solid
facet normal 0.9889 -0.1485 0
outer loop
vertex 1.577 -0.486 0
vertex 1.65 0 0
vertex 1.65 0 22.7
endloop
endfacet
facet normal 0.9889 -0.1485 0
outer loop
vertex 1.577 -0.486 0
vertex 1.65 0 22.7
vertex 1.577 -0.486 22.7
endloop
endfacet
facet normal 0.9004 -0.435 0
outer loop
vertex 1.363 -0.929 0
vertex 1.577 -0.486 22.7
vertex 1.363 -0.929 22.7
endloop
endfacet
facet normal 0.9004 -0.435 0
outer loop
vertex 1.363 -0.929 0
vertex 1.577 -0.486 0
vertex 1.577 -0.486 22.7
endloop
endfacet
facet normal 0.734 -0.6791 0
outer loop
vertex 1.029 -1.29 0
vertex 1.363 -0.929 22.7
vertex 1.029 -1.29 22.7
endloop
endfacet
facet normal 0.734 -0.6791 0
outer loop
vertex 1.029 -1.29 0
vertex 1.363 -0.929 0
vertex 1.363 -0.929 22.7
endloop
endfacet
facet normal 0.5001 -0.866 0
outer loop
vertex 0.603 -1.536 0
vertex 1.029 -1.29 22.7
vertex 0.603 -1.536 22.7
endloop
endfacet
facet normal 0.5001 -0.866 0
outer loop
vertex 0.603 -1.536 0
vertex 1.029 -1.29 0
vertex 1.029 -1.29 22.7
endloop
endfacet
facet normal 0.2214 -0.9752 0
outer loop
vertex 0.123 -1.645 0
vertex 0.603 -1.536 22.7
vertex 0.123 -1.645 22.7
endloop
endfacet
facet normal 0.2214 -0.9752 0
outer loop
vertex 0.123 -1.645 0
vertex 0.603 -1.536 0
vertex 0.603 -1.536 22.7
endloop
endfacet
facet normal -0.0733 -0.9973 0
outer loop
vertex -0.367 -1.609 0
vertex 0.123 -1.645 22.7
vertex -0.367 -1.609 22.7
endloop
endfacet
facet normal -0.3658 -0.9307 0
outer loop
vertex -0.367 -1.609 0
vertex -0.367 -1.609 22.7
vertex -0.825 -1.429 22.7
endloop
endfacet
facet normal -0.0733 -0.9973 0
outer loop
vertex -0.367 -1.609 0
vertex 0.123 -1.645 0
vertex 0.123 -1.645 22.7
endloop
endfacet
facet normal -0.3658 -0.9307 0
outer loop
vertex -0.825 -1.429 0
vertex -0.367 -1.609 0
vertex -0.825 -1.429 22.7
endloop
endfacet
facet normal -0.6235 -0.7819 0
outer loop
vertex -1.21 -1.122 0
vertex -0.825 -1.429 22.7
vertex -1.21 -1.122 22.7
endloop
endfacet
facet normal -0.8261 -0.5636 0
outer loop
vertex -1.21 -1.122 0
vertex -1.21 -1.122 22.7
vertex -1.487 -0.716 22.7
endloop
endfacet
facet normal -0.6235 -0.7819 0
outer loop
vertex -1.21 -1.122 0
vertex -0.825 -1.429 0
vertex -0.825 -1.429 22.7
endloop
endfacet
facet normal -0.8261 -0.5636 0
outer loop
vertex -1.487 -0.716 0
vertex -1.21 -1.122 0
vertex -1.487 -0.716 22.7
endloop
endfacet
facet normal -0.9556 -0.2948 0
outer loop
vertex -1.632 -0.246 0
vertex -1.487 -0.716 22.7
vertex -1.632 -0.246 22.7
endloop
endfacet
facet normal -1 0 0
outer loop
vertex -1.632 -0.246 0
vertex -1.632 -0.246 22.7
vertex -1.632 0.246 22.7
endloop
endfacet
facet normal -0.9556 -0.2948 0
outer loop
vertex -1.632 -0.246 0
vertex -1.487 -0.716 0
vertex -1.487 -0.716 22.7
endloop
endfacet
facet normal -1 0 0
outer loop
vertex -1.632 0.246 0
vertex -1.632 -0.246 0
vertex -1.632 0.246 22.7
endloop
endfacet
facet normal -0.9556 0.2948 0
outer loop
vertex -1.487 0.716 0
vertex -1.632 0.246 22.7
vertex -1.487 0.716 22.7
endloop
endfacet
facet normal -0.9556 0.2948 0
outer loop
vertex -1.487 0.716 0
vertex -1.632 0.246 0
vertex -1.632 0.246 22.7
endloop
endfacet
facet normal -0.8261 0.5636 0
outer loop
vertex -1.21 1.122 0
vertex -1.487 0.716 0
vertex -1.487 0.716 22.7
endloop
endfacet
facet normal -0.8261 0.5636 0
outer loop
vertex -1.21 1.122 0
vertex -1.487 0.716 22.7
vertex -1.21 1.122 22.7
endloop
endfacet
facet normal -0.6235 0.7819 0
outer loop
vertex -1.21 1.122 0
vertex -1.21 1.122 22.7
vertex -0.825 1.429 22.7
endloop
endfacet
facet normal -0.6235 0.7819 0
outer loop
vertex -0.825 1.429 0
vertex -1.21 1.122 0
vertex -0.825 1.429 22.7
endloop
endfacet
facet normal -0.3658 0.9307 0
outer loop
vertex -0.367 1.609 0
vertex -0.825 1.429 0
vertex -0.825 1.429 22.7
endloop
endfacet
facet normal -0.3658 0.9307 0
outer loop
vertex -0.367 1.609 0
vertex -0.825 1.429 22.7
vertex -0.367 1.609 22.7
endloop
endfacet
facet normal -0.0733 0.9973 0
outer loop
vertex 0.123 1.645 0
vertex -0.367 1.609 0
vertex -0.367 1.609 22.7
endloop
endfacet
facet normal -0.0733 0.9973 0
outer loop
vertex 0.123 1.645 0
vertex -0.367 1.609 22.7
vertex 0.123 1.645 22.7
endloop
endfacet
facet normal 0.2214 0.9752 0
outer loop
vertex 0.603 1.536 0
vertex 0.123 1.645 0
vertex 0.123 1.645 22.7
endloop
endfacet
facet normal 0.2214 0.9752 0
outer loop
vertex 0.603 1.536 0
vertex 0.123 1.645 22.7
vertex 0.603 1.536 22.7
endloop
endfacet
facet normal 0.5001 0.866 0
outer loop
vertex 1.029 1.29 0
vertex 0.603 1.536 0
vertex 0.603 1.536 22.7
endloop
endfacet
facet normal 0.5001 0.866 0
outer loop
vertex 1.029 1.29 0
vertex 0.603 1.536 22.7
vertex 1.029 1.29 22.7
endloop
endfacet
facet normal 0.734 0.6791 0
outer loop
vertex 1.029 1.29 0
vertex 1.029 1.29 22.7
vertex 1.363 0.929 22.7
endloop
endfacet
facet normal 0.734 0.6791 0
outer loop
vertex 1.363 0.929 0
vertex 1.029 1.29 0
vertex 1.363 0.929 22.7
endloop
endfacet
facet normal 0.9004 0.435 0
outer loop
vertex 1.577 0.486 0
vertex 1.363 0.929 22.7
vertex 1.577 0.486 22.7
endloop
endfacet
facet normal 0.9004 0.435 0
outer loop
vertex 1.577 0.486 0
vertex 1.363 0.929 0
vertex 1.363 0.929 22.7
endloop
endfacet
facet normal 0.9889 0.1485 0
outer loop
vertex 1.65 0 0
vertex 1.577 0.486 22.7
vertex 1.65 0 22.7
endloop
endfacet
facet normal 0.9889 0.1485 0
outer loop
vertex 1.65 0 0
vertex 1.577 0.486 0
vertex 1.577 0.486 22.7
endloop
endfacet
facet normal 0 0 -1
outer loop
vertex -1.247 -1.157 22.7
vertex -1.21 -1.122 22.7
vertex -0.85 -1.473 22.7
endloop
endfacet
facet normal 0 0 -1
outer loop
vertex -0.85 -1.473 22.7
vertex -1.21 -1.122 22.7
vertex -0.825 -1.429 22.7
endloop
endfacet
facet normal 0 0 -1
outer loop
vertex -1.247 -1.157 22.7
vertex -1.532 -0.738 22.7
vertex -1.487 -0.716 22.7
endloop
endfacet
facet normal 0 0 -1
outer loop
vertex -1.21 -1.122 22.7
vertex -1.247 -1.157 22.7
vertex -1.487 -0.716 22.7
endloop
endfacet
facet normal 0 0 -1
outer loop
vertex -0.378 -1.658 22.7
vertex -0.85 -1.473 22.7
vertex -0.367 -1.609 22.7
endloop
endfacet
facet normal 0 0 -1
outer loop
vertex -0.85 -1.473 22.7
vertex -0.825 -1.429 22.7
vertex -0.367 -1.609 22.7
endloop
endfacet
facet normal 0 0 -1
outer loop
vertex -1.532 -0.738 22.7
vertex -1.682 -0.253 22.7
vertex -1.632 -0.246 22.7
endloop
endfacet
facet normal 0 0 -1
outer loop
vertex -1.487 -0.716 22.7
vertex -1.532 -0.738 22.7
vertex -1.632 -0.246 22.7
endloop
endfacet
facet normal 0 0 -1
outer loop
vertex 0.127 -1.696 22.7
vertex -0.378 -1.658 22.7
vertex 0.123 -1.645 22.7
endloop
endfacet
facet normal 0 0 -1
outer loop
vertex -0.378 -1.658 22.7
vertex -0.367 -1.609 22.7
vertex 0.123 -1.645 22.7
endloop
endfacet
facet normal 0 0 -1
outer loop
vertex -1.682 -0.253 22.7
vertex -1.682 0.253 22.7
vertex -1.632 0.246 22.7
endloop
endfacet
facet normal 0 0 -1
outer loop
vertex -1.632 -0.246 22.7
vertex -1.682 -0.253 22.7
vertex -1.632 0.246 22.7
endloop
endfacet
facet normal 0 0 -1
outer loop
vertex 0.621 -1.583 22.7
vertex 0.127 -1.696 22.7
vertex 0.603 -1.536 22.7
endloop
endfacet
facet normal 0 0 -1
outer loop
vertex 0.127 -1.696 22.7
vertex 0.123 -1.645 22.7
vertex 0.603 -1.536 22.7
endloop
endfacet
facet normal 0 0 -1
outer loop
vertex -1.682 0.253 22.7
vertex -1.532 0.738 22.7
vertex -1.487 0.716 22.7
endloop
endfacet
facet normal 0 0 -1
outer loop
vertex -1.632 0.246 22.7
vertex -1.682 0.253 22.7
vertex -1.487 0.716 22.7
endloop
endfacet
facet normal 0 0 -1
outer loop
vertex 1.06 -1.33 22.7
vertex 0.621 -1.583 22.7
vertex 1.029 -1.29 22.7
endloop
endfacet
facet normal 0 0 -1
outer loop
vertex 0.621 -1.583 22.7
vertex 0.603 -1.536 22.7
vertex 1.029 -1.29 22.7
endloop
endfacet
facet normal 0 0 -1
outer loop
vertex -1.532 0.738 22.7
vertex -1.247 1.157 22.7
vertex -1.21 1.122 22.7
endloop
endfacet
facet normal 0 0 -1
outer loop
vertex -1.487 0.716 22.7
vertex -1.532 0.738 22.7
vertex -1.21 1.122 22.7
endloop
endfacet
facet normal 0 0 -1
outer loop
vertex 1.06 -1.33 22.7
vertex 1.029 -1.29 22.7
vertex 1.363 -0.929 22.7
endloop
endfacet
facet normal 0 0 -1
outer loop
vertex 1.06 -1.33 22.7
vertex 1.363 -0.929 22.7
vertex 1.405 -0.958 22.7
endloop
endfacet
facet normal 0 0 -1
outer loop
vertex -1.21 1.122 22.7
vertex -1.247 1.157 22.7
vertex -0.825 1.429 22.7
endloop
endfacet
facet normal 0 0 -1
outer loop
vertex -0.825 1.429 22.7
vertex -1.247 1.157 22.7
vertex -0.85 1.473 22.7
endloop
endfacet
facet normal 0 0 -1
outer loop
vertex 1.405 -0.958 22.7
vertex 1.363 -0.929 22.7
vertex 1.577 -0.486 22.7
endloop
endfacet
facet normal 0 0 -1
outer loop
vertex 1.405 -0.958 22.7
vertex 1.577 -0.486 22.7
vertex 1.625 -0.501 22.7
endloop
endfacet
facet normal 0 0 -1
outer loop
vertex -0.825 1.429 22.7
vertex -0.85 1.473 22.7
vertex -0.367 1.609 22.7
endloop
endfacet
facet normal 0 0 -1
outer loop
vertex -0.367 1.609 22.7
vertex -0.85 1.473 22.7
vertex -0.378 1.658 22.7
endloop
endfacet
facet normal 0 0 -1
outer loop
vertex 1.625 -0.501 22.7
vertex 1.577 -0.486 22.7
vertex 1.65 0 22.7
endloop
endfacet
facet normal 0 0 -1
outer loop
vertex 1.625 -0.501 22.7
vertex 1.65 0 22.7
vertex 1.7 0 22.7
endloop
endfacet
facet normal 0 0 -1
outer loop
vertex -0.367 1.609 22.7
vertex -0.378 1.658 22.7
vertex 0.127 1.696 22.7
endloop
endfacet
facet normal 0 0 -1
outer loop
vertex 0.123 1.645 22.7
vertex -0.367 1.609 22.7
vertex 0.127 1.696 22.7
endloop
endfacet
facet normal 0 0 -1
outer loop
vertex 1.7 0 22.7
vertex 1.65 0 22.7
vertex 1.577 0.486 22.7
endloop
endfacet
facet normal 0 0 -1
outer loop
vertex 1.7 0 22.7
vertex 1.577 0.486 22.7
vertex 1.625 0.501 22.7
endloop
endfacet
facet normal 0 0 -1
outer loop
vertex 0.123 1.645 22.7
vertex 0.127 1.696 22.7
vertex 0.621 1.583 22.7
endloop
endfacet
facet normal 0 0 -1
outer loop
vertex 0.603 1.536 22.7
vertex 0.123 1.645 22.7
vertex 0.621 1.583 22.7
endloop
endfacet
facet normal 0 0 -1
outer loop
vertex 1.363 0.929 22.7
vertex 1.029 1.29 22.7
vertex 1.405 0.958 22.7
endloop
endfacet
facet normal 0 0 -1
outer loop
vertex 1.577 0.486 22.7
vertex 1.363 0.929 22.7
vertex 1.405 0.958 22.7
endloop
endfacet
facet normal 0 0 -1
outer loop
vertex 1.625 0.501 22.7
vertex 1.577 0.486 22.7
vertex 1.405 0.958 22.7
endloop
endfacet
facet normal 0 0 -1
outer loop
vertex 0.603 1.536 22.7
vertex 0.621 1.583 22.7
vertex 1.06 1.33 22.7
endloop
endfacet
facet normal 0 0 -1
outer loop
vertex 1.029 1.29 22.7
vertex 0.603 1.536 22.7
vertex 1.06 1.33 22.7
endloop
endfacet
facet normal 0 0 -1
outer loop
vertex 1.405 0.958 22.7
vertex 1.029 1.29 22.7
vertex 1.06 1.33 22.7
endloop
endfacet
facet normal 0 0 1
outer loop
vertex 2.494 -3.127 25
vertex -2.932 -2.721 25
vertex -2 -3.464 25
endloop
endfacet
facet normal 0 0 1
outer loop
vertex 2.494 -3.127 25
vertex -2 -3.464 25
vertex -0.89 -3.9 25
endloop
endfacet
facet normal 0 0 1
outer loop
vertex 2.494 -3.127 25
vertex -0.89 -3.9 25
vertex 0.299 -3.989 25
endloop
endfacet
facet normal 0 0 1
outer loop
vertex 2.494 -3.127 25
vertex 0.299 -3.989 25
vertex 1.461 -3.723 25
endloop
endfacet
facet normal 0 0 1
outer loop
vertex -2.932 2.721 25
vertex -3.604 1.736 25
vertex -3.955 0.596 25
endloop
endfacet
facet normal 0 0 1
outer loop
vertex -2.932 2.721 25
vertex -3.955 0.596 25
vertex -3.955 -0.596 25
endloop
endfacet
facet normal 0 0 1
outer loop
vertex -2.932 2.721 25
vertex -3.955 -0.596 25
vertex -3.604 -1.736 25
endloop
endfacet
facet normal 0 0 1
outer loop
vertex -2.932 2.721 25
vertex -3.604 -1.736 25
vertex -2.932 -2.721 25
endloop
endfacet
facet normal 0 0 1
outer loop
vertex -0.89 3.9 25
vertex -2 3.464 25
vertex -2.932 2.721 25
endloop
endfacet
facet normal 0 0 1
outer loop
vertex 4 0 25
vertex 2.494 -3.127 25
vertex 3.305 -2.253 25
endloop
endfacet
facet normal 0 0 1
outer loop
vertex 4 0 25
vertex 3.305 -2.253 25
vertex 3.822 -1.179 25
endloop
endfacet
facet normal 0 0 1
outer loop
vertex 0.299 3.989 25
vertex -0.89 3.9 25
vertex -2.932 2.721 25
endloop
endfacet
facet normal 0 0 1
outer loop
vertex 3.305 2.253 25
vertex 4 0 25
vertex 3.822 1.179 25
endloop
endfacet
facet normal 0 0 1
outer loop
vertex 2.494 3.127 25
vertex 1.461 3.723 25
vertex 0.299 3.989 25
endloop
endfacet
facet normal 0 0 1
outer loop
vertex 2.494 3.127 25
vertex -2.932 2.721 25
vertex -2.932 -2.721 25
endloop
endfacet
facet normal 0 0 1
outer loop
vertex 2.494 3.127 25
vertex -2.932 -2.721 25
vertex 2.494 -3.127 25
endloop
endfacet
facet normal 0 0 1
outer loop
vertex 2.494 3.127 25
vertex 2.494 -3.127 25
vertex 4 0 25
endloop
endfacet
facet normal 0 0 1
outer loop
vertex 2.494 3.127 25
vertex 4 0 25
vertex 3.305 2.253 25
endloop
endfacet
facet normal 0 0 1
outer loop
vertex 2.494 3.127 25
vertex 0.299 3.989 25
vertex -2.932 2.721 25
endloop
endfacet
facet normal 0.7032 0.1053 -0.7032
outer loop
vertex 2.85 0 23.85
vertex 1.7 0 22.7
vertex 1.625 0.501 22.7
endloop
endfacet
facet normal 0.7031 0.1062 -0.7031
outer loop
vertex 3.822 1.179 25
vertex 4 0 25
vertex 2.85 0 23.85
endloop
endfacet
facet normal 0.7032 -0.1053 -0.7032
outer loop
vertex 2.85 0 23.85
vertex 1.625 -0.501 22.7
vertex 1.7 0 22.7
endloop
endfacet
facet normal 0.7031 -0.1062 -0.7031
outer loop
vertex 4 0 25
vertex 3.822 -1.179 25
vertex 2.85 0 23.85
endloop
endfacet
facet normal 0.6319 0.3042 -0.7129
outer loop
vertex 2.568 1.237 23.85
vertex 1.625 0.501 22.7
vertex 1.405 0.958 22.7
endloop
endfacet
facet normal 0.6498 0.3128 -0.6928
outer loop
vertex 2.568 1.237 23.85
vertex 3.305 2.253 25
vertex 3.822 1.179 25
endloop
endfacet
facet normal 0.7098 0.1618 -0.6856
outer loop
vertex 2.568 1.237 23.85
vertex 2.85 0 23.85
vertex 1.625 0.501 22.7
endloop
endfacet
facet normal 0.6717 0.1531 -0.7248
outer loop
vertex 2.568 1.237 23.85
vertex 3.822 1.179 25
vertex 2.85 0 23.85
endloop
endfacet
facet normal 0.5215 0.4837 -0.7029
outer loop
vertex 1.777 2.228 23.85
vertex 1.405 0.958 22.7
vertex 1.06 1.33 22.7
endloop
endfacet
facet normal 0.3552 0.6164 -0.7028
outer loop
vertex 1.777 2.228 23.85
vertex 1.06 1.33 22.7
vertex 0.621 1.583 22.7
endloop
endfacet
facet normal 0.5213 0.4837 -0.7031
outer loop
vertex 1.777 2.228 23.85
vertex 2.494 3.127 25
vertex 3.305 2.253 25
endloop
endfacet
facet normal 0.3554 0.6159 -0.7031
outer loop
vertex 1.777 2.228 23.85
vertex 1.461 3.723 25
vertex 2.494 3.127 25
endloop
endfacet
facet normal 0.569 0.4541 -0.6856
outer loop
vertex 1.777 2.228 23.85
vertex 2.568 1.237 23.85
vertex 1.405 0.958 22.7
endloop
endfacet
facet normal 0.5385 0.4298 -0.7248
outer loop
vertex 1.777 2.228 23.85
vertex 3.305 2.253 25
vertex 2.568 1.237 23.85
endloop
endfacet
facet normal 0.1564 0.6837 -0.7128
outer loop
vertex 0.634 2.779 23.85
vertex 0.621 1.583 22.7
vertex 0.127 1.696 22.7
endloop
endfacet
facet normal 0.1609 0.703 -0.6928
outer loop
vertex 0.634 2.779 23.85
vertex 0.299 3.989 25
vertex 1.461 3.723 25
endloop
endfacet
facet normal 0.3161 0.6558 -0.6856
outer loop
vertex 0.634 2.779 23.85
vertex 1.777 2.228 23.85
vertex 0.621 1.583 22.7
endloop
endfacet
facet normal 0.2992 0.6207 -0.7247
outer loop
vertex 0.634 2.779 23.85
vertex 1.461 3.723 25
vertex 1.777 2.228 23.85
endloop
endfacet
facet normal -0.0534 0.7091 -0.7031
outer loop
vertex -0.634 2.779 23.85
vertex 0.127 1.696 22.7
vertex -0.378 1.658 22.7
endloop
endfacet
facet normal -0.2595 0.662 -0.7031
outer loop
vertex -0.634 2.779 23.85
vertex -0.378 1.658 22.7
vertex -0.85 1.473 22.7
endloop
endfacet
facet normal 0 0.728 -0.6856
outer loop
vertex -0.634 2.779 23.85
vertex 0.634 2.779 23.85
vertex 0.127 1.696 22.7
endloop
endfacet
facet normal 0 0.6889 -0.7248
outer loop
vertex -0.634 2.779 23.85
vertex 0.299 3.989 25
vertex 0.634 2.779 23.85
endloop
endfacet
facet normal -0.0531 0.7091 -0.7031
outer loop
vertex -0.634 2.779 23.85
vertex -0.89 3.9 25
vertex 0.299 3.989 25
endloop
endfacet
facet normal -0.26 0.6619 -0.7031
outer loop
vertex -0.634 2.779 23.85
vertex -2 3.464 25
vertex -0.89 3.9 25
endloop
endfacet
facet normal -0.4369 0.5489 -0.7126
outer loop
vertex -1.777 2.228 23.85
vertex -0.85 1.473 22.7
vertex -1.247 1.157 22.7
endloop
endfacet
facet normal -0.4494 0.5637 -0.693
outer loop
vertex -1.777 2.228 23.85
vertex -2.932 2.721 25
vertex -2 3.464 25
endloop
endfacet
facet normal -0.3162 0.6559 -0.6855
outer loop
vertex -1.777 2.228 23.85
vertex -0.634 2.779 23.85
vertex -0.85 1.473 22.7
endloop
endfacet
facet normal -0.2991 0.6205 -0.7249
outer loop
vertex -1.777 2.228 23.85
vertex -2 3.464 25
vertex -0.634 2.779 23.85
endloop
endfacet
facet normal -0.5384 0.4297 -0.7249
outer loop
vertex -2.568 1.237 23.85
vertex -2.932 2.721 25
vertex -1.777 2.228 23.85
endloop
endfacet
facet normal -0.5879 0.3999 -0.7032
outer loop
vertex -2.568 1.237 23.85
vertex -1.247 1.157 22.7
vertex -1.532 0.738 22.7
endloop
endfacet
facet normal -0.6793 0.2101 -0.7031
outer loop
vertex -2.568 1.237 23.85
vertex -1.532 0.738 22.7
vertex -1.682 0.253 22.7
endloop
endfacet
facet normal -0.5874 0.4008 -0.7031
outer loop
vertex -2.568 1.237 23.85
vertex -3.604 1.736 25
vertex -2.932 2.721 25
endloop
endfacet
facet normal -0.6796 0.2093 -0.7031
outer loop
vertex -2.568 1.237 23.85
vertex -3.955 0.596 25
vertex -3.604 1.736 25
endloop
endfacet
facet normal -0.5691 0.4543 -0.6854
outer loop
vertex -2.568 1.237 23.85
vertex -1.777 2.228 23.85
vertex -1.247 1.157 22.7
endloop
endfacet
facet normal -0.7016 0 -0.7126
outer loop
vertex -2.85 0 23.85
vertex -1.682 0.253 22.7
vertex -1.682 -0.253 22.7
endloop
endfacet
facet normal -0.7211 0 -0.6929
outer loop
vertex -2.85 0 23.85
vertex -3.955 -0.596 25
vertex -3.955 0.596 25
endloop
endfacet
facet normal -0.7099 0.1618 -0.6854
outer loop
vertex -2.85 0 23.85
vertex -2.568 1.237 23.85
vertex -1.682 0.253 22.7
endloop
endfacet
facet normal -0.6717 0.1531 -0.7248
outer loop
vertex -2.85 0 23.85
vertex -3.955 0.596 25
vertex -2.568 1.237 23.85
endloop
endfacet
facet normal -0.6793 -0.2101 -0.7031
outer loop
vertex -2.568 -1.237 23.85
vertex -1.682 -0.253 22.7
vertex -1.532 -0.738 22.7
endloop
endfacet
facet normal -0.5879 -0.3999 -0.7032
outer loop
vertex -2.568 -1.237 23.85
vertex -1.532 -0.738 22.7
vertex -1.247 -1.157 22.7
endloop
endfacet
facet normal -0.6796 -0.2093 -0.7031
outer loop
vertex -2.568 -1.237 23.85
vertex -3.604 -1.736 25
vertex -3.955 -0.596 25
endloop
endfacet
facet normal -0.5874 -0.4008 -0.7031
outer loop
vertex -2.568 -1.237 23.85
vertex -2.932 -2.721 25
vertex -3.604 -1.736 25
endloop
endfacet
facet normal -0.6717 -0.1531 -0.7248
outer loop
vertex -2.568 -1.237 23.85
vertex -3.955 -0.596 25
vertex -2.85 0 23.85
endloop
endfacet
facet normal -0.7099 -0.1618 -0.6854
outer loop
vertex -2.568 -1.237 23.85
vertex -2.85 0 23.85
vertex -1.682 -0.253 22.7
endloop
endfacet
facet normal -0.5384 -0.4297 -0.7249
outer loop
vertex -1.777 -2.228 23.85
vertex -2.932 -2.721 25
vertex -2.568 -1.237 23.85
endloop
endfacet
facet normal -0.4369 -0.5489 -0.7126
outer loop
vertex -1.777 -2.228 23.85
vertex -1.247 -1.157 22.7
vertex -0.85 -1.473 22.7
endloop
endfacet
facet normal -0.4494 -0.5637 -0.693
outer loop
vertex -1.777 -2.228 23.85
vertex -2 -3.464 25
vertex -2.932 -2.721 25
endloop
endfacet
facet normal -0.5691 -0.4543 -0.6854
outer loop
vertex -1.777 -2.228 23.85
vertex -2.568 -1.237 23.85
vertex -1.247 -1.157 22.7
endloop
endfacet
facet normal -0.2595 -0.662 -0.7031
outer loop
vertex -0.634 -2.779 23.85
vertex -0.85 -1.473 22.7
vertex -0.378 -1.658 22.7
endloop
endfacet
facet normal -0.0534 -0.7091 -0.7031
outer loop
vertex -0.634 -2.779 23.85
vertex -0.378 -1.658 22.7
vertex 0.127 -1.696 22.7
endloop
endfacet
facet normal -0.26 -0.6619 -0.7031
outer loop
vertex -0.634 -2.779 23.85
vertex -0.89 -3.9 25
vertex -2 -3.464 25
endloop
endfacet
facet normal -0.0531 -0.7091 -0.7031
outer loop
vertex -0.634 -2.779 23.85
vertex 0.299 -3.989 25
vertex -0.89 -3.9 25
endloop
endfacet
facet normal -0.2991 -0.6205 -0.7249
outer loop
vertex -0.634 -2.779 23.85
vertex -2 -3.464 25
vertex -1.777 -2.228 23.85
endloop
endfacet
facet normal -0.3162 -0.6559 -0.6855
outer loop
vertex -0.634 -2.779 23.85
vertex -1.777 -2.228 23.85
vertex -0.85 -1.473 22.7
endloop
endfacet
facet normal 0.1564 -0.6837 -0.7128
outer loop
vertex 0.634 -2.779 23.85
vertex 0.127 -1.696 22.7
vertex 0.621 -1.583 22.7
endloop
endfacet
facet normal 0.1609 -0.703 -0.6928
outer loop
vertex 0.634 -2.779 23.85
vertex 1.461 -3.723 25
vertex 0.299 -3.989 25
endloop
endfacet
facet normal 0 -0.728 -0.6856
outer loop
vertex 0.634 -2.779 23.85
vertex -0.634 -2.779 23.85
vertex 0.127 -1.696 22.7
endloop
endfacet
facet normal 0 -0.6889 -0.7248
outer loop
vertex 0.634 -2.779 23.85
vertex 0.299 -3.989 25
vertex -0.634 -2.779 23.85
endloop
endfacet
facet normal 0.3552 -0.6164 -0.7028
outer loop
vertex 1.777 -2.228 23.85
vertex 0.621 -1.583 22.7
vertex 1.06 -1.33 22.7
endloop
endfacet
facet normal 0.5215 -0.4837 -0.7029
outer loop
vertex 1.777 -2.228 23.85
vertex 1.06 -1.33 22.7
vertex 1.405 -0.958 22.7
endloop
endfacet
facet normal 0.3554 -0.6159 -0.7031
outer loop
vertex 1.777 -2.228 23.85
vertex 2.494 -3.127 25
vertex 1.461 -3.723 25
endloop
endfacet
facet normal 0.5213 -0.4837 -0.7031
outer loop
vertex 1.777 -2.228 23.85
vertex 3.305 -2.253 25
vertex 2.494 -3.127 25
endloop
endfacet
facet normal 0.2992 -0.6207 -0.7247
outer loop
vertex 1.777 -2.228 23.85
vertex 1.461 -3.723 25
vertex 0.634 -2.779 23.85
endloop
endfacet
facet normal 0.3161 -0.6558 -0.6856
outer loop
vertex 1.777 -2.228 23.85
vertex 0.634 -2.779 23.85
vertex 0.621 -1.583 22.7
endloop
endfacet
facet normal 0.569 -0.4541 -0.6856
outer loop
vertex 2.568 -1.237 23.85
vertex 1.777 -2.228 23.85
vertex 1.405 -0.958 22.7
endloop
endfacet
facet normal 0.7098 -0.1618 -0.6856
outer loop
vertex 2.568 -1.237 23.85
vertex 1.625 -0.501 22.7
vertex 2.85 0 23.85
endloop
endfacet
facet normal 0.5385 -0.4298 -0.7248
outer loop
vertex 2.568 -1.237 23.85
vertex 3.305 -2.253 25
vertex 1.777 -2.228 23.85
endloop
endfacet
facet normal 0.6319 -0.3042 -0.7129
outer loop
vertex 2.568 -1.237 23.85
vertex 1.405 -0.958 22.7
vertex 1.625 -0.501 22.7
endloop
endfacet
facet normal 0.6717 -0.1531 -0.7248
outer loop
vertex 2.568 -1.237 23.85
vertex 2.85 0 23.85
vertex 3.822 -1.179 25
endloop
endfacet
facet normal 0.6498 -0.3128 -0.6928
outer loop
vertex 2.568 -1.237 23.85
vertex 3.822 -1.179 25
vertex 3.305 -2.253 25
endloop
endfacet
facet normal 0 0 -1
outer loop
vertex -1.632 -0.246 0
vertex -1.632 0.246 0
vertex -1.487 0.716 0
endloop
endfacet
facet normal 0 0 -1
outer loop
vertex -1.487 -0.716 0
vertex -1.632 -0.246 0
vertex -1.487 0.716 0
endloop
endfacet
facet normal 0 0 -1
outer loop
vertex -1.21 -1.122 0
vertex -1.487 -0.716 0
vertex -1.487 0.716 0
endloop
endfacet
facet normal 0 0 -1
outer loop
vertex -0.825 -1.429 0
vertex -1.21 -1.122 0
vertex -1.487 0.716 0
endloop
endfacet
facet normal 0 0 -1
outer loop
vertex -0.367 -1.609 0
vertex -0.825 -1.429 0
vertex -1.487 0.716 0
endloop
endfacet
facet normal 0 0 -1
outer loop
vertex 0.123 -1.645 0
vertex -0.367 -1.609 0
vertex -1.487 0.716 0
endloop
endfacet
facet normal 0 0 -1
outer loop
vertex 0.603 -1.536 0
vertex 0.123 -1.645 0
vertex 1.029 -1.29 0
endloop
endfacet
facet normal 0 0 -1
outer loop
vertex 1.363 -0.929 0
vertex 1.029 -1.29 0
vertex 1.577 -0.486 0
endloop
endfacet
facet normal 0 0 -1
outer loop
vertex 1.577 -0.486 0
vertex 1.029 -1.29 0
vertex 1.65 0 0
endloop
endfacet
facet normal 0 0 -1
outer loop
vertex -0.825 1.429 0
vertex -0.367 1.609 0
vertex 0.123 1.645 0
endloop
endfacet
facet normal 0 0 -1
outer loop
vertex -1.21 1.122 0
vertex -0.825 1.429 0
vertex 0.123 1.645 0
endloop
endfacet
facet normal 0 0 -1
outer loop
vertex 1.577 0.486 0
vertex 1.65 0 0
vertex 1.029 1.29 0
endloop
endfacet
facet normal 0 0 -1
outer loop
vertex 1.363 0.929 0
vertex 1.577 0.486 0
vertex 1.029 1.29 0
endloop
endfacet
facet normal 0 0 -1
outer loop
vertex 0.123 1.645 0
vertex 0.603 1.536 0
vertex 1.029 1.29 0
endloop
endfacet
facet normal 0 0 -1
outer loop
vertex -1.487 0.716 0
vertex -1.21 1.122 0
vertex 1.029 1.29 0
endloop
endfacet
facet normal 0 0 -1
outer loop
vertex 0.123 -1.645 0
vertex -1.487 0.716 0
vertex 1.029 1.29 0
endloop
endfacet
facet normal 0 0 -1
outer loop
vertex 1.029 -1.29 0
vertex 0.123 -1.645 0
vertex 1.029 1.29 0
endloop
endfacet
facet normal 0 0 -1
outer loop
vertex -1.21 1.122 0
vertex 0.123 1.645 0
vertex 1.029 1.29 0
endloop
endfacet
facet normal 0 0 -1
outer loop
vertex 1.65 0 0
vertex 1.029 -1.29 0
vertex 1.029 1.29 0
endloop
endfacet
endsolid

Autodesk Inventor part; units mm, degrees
ref_plane "YZ Plane" through (0, 0, 0) normal (1, 0, 0) x (0, 1, 0)
ref_plane "XZ Plane" through (0, 0, 0) normal (0, 1, 0) x (-1, 0, 0)
ref_plane "XY Plane" through (0, 0, 0) normal (0, 0, 1) x (1, 0, 0)
sketch "スケッチ1" plane through (0, 0, 0) normal (0, 0, 1) x (1, 0, 0)
  circle A0 centre (0, 0) radius 1.65
  dimension "d0" = 3.3
extrude "押し出し1" add sketch "スケッチ1" along normal blind 25
sketch "スケッチ2" plane through (0, 0, 25) normal (0, 0, 1) x (1, 0, 0)
  circle A0 centre (0, 0) radius 4
  dimension "d3" = 8
extrude "押し出し2" add sketch "スケッチ2" against normal blind 2.3
chamfer "面取り1" distance 2.3 angle 45 1 edges at (-4, 0, 22.7)
thread "ねじ1" size "M3.5x0.6" class "6g" standard "ANSI Metric M Profile" full length
properties part number "ネジ皿m4,25" material "鋼、高強度、低合金"
